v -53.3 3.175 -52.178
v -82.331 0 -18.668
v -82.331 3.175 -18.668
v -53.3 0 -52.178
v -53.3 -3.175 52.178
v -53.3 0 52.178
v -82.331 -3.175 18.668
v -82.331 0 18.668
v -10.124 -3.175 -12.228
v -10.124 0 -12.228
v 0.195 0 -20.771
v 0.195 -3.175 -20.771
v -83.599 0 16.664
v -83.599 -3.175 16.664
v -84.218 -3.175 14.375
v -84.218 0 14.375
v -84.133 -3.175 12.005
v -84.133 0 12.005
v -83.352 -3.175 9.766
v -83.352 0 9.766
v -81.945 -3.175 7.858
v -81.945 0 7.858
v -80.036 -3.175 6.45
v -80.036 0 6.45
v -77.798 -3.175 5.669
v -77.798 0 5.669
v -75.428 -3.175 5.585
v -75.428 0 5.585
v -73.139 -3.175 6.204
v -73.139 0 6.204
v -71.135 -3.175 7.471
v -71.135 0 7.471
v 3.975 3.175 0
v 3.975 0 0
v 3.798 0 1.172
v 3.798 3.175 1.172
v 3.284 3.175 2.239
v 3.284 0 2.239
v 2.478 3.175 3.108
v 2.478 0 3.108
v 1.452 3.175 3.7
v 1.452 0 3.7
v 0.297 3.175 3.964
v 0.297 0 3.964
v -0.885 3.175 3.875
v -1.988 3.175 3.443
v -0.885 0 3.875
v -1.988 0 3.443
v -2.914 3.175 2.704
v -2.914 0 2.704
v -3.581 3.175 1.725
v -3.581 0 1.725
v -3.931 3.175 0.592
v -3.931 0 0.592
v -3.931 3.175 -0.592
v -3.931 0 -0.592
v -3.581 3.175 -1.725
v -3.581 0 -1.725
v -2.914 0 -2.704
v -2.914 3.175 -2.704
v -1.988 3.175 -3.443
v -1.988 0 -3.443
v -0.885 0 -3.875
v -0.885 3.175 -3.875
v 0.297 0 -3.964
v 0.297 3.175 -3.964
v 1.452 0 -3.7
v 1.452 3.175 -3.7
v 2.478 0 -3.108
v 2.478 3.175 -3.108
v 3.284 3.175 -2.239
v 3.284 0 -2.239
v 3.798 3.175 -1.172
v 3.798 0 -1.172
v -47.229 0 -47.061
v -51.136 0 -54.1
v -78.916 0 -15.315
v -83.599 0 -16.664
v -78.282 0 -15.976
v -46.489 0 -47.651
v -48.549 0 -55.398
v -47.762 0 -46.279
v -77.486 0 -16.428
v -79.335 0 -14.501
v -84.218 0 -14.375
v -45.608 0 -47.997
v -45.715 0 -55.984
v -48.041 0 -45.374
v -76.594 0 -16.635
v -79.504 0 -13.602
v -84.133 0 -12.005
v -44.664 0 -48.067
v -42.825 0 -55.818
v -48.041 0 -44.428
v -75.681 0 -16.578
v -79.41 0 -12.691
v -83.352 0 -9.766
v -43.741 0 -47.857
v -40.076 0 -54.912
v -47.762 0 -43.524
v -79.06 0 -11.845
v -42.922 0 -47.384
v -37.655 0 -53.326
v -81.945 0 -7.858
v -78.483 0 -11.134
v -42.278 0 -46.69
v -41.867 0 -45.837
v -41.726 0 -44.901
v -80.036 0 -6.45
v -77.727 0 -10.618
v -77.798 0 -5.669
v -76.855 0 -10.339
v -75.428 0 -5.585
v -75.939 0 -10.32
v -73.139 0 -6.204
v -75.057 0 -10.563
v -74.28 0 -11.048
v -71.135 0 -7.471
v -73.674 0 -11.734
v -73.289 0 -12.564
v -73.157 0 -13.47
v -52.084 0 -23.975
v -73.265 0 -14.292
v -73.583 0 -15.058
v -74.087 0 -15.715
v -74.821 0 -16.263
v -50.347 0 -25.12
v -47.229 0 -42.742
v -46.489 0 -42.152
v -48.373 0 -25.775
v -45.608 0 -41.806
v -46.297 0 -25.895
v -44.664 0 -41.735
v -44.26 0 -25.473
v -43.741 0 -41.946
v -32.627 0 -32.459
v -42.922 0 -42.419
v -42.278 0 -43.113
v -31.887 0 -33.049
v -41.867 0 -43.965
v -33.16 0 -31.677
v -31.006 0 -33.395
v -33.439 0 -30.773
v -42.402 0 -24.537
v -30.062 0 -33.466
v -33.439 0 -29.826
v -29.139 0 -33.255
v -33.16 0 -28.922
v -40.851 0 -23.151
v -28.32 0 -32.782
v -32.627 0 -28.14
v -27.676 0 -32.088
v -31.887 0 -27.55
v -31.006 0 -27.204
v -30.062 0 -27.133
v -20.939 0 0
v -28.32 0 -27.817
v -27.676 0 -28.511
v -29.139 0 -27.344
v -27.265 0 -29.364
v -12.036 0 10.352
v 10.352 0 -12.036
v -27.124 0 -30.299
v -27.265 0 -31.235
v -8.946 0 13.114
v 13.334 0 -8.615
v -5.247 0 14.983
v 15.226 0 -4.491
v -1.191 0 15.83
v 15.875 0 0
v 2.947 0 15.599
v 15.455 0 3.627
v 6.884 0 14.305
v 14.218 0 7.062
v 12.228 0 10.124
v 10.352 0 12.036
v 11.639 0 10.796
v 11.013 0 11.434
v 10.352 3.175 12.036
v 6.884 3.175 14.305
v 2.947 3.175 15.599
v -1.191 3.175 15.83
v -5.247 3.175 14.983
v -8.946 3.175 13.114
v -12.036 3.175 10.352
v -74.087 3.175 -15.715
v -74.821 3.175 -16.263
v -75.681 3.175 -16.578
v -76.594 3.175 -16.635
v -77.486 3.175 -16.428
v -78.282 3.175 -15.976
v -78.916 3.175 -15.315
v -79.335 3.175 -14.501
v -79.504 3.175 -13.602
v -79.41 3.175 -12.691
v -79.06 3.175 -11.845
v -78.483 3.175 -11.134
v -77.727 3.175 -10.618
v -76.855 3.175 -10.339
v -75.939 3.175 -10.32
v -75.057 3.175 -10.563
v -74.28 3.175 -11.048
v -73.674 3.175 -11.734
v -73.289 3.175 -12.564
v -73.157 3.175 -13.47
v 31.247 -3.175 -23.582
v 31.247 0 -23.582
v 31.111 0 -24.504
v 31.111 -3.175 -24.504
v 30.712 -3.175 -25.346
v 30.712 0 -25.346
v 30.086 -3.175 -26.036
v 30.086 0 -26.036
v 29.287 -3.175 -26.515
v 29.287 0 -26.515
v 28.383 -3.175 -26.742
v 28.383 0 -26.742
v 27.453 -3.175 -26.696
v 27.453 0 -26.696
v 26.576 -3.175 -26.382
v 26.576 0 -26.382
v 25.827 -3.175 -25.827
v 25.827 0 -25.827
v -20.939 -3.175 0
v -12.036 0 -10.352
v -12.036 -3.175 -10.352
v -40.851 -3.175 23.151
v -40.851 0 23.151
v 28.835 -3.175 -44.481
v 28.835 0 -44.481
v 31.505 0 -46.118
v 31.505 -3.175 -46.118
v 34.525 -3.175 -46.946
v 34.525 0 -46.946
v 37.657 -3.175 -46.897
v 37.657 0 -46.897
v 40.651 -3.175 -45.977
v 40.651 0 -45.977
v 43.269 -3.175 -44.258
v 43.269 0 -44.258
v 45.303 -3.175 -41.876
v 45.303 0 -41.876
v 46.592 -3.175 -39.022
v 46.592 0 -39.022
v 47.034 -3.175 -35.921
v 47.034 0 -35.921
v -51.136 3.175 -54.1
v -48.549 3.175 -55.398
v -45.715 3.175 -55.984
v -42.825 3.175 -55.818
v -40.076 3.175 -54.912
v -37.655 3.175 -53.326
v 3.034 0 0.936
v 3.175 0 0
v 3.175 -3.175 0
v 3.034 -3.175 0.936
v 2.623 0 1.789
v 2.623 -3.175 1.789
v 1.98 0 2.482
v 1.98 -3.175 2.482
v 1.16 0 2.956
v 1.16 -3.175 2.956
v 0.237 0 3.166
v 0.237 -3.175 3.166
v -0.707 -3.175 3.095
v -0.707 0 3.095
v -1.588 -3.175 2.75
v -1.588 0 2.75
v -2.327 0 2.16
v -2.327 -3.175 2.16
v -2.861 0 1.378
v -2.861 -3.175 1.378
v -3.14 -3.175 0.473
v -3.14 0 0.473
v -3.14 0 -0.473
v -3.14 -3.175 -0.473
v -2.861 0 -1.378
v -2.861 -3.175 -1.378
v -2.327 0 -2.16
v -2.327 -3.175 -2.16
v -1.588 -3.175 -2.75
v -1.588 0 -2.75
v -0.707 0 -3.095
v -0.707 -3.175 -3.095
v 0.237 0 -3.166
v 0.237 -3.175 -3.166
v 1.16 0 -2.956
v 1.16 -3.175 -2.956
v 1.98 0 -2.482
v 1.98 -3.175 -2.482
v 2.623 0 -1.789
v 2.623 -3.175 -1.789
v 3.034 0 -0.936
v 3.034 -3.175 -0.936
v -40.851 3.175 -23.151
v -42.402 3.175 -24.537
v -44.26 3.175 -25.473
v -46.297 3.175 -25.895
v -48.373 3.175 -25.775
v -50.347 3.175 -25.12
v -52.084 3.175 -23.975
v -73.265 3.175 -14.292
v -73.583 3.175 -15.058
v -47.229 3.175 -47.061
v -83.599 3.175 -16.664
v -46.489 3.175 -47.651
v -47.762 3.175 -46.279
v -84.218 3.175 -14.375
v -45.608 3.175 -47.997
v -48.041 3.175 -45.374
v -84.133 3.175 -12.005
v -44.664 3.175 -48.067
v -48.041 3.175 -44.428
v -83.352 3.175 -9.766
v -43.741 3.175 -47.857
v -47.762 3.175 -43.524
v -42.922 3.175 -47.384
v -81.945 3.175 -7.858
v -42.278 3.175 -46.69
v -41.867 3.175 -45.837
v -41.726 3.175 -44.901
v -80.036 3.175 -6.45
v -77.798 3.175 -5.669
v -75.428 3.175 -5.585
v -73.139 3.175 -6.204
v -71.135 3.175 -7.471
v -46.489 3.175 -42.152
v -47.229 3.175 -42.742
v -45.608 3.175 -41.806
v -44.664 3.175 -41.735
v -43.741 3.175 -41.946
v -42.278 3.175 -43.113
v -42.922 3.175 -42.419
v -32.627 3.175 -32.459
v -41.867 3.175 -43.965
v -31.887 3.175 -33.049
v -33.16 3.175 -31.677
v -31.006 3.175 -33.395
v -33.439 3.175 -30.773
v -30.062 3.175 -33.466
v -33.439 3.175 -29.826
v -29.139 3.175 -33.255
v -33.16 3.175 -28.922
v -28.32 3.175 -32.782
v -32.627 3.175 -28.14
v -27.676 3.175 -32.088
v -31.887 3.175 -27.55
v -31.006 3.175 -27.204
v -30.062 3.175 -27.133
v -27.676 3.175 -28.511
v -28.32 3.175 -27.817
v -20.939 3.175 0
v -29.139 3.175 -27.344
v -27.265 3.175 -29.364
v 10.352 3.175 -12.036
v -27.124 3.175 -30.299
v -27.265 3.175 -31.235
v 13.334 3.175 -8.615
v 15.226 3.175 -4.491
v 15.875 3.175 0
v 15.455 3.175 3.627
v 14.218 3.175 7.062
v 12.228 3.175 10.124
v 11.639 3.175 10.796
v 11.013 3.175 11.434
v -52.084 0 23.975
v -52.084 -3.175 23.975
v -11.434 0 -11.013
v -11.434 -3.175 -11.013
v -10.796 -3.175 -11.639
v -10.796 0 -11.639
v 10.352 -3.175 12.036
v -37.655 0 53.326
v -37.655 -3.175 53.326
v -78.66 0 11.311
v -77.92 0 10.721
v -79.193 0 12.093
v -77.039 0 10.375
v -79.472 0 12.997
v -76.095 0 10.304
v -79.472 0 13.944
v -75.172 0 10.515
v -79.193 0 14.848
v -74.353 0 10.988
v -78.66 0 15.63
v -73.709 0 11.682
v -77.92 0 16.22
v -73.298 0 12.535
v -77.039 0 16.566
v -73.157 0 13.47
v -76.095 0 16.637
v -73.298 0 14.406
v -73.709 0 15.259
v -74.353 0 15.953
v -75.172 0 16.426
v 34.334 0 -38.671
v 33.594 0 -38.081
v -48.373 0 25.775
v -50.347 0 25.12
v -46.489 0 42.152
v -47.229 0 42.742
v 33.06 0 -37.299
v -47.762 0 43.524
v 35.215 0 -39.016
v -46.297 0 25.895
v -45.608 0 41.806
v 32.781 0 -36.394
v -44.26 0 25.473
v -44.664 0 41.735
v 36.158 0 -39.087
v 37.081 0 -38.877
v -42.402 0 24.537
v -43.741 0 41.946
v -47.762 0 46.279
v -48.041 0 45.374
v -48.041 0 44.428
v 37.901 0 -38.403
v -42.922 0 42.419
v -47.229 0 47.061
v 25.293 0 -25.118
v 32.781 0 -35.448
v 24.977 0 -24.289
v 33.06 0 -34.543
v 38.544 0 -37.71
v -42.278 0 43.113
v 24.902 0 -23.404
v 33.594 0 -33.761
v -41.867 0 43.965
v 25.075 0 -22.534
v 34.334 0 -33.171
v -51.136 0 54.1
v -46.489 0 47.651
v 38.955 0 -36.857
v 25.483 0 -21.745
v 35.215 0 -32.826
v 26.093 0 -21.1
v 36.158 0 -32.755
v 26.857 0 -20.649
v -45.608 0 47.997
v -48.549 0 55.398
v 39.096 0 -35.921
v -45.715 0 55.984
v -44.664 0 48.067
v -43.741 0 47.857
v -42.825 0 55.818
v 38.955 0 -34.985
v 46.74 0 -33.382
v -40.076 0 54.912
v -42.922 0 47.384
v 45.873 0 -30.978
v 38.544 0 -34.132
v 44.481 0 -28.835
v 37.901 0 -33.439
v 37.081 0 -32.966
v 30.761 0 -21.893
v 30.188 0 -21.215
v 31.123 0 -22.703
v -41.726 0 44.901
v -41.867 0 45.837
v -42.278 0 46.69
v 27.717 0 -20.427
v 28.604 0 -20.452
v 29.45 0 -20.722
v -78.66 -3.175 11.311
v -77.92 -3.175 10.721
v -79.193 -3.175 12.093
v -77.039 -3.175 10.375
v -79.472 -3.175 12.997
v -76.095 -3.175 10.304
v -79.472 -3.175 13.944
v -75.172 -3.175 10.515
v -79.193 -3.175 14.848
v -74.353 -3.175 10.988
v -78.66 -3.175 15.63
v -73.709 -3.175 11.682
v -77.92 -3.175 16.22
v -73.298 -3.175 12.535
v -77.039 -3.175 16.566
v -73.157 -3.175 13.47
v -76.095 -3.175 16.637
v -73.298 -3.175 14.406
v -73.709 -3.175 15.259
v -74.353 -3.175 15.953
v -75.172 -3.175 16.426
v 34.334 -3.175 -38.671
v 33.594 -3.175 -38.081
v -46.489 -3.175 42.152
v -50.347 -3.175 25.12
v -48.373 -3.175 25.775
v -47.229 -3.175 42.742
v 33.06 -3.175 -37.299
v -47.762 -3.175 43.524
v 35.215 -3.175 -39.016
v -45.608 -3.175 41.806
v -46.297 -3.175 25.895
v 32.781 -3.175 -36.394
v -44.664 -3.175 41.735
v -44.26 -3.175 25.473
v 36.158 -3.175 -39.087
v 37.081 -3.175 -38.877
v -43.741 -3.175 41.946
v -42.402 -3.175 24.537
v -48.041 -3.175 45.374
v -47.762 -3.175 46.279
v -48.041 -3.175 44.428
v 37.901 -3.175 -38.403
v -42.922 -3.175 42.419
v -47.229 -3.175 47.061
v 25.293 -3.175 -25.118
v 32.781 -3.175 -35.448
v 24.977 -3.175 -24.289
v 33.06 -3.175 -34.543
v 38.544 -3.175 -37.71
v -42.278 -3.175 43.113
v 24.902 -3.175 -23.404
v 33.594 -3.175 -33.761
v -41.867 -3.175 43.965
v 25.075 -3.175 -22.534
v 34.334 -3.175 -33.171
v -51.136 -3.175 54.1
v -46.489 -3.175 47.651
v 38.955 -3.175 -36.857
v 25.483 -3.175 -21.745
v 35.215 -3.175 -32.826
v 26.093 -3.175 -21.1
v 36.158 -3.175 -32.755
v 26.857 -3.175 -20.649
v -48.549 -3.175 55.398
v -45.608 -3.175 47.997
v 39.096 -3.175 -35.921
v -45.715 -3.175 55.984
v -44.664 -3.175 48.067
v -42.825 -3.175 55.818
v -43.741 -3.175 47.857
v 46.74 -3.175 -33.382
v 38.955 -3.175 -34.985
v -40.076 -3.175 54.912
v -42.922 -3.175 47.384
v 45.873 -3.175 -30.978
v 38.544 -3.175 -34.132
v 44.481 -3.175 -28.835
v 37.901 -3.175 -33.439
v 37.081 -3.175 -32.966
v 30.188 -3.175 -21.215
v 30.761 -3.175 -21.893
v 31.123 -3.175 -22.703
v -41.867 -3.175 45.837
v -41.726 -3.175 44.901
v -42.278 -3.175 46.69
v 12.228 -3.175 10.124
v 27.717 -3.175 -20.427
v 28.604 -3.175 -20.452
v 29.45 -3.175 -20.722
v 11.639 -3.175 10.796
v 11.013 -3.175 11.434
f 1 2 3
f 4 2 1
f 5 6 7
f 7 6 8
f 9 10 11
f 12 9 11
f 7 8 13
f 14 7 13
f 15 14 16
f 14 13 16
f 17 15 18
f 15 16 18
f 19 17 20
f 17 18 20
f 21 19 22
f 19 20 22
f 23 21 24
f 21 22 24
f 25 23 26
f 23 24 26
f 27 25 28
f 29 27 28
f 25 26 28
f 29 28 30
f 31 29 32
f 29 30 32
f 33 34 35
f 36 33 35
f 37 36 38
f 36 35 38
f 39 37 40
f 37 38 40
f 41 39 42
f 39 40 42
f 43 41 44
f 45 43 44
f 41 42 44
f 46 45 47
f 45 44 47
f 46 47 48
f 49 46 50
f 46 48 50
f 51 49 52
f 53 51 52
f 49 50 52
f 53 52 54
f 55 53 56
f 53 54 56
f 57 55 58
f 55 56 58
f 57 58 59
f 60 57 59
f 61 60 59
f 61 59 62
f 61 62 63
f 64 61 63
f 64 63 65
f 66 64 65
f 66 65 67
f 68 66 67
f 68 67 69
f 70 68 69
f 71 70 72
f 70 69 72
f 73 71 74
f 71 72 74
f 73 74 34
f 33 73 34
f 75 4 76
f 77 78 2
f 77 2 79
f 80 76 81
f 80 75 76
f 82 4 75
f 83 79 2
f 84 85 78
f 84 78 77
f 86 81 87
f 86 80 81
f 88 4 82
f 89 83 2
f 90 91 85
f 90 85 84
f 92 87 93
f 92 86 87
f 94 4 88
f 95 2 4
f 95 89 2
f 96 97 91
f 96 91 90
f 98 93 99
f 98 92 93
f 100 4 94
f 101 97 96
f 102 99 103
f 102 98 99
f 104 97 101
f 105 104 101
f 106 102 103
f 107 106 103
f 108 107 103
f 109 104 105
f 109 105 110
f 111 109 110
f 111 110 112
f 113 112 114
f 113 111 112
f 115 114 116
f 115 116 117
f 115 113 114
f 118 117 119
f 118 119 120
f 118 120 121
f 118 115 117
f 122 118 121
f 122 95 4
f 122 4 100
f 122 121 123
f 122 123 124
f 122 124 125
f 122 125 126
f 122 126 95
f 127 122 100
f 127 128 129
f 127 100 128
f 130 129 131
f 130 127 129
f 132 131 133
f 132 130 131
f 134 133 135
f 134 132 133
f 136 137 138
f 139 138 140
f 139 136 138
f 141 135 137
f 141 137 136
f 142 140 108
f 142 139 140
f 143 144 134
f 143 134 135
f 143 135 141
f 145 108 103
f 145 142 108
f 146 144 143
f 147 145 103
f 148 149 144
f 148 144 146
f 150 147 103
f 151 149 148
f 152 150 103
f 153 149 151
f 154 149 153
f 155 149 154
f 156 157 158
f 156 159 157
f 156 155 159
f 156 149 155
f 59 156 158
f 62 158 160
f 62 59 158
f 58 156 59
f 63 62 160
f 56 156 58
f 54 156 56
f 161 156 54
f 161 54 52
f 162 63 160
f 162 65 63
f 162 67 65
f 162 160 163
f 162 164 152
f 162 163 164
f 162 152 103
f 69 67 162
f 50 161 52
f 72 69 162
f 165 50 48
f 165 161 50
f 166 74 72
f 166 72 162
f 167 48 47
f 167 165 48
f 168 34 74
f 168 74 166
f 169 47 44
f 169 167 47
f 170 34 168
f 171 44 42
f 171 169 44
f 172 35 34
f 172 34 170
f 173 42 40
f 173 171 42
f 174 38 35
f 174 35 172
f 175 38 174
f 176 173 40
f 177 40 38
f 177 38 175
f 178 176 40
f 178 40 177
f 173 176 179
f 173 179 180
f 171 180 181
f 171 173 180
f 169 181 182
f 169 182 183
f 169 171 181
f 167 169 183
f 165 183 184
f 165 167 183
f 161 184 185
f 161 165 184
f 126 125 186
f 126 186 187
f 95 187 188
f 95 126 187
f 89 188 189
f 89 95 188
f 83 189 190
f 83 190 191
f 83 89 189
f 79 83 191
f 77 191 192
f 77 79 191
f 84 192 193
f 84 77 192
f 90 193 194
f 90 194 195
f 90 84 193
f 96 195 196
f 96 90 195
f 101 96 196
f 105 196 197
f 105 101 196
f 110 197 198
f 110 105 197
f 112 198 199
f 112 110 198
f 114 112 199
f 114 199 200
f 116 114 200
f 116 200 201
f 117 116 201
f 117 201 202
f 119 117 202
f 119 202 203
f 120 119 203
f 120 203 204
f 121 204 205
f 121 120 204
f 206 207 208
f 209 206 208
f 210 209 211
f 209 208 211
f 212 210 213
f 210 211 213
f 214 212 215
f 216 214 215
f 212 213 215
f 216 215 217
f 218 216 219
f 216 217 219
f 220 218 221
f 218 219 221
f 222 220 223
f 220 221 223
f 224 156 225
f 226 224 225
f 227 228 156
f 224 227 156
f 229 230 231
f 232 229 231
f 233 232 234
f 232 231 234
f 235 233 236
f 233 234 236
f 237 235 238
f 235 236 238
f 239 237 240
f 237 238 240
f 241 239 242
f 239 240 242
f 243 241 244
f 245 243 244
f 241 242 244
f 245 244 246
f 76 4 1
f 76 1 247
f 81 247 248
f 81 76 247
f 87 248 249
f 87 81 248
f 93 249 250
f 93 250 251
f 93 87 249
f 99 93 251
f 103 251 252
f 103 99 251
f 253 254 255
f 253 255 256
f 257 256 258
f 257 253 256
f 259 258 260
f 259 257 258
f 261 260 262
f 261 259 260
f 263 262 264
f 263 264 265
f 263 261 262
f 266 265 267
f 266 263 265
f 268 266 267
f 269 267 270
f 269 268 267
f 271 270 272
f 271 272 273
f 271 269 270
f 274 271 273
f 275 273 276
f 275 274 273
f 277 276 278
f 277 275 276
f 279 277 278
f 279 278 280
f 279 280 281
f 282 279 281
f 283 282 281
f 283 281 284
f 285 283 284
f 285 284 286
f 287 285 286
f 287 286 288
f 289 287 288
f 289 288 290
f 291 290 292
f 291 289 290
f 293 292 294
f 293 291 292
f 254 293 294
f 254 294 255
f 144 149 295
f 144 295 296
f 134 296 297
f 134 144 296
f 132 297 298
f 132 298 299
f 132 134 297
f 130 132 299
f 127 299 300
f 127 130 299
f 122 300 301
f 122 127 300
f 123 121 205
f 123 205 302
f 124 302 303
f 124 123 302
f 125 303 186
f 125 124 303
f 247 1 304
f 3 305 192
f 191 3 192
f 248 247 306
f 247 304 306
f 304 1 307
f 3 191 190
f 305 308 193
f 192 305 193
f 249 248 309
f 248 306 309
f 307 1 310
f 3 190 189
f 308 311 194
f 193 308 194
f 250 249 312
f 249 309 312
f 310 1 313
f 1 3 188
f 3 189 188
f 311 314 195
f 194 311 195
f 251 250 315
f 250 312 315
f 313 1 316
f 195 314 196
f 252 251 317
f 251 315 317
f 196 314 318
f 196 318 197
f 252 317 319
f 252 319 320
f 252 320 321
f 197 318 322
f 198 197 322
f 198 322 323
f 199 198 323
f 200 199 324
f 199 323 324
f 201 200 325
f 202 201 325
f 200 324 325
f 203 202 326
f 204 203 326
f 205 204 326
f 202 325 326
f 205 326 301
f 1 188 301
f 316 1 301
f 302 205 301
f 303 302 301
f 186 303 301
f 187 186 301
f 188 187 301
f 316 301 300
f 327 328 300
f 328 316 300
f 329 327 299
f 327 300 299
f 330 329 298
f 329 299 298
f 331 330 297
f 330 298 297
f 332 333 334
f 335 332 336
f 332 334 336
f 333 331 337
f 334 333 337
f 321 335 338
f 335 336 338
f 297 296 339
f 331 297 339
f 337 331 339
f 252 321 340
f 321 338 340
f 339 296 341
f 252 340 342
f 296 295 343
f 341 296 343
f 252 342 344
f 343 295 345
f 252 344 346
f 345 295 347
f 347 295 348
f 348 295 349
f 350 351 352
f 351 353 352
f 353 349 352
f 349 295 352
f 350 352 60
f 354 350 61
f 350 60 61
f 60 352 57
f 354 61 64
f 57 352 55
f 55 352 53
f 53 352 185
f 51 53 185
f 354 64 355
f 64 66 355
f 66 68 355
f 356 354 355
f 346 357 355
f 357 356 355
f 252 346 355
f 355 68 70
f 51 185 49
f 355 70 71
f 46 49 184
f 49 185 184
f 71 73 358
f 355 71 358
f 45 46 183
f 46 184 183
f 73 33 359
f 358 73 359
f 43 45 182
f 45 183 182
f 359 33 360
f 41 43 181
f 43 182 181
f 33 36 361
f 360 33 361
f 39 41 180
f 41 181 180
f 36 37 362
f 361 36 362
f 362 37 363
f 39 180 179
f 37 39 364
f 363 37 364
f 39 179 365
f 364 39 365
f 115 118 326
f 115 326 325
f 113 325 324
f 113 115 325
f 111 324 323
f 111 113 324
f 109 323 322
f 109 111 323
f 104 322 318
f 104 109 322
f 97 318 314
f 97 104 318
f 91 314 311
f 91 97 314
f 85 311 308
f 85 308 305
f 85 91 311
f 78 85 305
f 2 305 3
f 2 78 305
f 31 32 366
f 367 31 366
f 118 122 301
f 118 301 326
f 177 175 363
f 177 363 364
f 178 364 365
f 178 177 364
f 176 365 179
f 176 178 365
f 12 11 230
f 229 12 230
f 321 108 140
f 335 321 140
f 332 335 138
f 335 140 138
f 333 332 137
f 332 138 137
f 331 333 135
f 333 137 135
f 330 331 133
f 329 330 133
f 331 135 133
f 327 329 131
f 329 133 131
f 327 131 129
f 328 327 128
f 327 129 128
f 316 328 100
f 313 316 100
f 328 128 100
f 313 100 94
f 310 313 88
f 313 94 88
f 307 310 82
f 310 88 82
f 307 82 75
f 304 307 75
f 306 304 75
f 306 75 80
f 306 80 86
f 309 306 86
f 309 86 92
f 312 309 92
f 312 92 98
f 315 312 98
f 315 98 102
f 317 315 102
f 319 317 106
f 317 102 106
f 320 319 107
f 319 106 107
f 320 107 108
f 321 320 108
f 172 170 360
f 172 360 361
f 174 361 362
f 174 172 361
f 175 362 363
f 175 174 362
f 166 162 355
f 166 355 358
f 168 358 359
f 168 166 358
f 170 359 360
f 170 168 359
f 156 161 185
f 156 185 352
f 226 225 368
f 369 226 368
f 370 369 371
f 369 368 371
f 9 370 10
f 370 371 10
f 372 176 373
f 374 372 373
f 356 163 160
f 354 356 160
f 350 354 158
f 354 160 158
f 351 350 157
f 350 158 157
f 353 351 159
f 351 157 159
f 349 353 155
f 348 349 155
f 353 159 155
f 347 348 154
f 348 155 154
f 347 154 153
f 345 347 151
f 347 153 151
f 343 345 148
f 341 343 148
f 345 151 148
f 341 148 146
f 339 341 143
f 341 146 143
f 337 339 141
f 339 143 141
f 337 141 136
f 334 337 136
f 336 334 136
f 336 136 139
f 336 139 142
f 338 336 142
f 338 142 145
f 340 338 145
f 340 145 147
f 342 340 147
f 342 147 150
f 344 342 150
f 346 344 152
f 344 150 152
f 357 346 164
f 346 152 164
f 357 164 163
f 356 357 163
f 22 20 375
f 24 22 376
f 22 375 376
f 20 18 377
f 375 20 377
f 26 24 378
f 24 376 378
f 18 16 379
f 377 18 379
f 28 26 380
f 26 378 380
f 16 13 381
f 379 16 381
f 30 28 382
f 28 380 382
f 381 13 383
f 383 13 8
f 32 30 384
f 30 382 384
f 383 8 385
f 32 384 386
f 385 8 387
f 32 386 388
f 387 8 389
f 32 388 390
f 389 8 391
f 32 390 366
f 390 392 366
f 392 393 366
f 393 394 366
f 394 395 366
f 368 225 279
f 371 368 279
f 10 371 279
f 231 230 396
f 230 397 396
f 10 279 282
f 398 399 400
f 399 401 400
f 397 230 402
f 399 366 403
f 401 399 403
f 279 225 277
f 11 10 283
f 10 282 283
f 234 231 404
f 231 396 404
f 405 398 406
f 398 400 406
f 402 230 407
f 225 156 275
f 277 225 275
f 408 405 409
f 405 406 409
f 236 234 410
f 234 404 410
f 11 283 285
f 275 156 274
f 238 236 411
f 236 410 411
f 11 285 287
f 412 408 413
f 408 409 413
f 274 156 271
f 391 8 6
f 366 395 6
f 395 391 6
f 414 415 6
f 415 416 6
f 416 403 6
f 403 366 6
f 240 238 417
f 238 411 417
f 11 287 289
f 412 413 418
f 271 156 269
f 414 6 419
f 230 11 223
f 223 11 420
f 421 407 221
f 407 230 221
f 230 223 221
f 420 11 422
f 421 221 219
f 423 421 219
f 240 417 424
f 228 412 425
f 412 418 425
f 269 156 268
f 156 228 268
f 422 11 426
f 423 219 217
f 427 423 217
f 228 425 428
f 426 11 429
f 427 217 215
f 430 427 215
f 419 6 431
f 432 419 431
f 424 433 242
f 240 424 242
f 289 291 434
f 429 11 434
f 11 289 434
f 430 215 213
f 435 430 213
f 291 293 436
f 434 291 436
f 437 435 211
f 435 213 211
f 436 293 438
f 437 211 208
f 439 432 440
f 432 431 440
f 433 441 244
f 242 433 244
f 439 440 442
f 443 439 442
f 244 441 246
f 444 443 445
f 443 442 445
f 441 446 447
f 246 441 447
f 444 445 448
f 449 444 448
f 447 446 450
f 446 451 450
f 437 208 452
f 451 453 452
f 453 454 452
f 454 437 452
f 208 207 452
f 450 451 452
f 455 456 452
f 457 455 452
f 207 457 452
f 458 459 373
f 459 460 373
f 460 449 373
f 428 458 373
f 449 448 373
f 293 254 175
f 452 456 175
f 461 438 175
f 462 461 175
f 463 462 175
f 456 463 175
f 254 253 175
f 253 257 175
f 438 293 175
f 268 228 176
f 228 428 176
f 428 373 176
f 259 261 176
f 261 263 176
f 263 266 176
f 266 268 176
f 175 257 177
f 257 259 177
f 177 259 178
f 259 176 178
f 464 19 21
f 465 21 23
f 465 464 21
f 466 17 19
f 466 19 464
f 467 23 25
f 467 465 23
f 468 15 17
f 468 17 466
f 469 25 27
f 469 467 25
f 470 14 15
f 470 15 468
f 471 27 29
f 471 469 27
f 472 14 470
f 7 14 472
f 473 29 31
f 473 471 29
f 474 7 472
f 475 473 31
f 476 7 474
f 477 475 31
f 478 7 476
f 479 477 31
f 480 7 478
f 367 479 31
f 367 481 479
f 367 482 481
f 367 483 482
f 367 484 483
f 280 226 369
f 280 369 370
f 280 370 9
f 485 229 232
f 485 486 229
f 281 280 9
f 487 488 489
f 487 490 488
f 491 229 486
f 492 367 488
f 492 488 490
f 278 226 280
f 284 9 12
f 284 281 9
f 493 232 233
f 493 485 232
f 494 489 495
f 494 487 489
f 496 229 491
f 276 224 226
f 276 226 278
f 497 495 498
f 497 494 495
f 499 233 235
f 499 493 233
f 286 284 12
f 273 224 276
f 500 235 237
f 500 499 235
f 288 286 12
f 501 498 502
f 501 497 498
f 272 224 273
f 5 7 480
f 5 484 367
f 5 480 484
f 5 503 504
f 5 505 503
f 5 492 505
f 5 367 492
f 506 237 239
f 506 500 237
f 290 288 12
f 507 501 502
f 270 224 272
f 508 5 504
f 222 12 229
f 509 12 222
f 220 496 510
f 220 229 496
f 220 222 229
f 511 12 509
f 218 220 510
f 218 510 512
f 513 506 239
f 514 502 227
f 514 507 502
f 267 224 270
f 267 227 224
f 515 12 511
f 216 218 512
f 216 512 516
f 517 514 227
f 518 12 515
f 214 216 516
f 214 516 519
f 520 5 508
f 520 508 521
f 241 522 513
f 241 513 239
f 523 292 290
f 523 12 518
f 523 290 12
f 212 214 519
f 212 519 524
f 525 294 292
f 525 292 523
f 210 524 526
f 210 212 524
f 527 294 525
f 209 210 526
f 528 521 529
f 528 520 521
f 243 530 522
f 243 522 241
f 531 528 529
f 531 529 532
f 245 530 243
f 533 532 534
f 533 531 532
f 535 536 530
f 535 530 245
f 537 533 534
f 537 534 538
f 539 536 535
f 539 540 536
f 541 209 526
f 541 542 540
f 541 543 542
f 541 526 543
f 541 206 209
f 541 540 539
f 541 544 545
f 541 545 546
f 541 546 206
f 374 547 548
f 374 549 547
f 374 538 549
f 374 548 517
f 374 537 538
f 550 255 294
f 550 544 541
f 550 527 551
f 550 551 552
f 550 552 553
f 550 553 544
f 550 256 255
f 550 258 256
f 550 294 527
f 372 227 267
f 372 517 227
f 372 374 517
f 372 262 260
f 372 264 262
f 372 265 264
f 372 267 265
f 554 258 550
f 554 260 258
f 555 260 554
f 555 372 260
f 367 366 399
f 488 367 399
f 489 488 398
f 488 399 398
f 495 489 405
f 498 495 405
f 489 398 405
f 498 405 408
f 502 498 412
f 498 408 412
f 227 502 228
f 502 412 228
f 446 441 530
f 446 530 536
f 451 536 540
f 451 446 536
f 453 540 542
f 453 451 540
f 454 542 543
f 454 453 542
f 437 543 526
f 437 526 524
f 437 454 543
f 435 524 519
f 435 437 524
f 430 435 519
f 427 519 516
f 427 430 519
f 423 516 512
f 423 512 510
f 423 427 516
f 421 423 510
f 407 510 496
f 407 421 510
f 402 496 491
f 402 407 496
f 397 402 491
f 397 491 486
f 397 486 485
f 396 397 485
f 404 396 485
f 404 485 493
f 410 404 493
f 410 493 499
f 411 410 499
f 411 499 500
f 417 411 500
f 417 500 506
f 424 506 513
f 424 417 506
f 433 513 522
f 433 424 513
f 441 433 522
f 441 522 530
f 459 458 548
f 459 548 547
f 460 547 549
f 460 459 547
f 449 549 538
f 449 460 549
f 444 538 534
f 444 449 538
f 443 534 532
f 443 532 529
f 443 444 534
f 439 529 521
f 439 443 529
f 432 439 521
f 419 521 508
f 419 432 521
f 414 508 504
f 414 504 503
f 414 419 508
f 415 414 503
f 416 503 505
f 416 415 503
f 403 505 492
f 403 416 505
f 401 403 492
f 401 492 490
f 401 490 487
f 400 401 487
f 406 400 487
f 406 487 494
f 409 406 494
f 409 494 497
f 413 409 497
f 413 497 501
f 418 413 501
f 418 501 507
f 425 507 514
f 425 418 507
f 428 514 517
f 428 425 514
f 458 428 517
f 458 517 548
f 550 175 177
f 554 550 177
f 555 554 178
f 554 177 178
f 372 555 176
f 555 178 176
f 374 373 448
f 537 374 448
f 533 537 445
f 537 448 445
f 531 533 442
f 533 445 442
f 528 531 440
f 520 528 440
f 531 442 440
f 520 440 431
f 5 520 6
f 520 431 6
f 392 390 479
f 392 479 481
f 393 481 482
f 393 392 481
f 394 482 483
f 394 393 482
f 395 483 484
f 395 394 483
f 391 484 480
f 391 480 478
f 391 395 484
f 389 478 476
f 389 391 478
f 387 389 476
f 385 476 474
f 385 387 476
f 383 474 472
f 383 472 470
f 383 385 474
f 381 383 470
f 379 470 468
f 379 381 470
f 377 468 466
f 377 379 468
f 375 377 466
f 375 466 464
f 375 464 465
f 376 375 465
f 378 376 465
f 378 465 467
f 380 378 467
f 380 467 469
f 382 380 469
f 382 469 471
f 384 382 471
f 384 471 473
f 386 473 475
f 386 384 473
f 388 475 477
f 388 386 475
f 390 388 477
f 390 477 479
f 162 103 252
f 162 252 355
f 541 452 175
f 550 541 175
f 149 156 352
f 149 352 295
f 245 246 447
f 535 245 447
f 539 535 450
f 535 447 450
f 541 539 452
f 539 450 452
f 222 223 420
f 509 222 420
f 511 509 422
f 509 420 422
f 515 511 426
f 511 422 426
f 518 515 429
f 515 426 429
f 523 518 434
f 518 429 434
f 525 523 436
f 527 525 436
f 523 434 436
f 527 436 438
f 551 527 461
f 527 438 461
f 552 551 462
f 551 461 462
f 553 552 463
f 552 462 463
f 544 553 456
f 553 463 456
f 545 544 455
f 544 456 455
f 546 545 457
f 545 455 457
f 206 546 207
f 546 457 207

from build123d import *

# Parameters (mm, degrees)
F0_R     = 3.175
F0_R_2   = 3.9751
F1_DEPTH = 3.175
F2_DEPTH = 3.175


with BuildPart() as f1:
    # F0 (on Front) → F1 (new body)
    with BuildSketch(Plane.XZ):
        with BuildLine():
            ThreePointArc((-82.331405076, 18.6678036462), (-73.5586383483, 20.9075469092), (-68.3946770291, 13.4703841816))
            ThreePointArc((-68.3946770291, 13.4703841816), (-69.1121208226, 10.1727039932), (-71.1347575644, 7.4711561347))
            Line((-71.1347575644, 7.4711561347), (-52.0843267669, 23.9754595323))
            ThreePointArc((-52.0843267669, 23.9754595323), (-46.2965222838, 25.8954961667), (-40.8511612346, 23.1508168672))
            Line((-40.8511612346, 23.1508168672), (-20.9391765456, 0))
            Line((-20.9391765456, 0), (-12.0356034274, 10.3518054047))
            ThreePointArc((-12.0356034274, 10.3518054047), (-1.190625, 15.8302885984), (10.3518054047, 12.0356034274))
            Line((10.3518054047, 12.0356034274), (-37.655016822, 53.3262030046))
            ThreePointArc((-37.655016822, 53.3262030046), (-34.8014845049, 49.5361241819), (-33.7887806053, 44.9012806053))
            ThreePointArc((-33.7887806053, 44.9012806053), (-48.7842347585, 34.4892527868), (-53.300199871, 52.1776678558))
            Line((-53.300199871, 52.1776678558), (-82.331405076, 18.6678036462))
        make_face()
        with BuildLine():
            ThreePointArc((-71.1347575644, 7.4711561347), (-69.1121208226, 10.1727039932), (-68.3946770291, 13.4703841816))
            ThreePointArc((-68.3946770291, 13.4703841816), (-73.5586383483, 20.9075469092), (-82.331405076, 18.6678036462))
            ThreePointArc((-82.331405076, 18.6678036462), (-81.9448371048, 7.8577241059), (-71.1347575644, 7.4711561347))
        make_face()
        with Locations((-76.3321770291, 13.4703841816)):
            Circle(F0_R, mode=Mode.SUBTRACT)
        with BuildLine():
            ThreePointArc((-37.655016822, 53.3262030046), (-45.7148756595, 55.9839571475), (-53.300199871, 52.1776678558))
            ThreePointArc((-53.300199871, 52.1776678558), (-48.7842347585, 34.4892527868), (-33.7887806053, 44.9012806053))
            ThreePointArc((-33.7887806053, 44.9012806053), (-34.8014845049, 49.5361241819), (-37.655016822, 53.3262030046))
        make_face()
        with Locations((-44.9012806053, 44.9012806053)):
            Circle(F0_R, mode=Mode.SUBTRACT)
        with BuildLine():
            ThreePointArc((12.2282550252, 10.1235074968), (11.3304373246, 11.1192092809), (10.3518054047, 12.0356034274))
            ThreePointArc((10.3518054047, 12.0356034274), (-1.190625, 15.8302885984), (-12.0356034274, 10.3518054047))
            ThreePointArc((-12.0356034274, 10.3518054047), (-15.875, 0), (-12.0356034274, -10.3518054047))
            ThreePointArc((-12.0356034274, -10.3518054047), (-11.1192092809, -11.3304373246), (-10.1235074968, -12.2282550252))
            ThreePointArc((-10.1235074968, -12.2282550252), (0.1493607821, -15.87429735), (10.3518054047, -12.0356034274))
            ThreePointArc((10.3518054047, -12.0356034274), (14.4282801435, -6.6212051093), (15.875, 0))
            ThreePointArc((15.875, 0), (14.9355142785, 5.3801522504), (12.2282550252, 10.1235074968))
        make_face()
        Circle(F0_R_2, mode=Mode.SUBTRACT)
        Circle(F0_R_2)
        Circle(F0_R, mode=Mode.SUBTRACT)
        with BuildLine():
            Line((44.4808030019, -28.8345692365), (12.2282550252, 10.1235074968))
            ThreePointArc((12.2282550252, 10.1235074968), (14.9355142785, 5.3801522504), (15.875, 0))
            ThreePointArc((15.875, 0), (14.4282801435, -6.6212051093), (10.3518054047, -12.0356034274))
            Line((10.3518054047, -12.0356034274), (0.1954344954, -20.7710836138))
            Line((0.1954344954, -20.7710836138), (28.8345692365, -44.4808030019))
            ThreePointArc((28.8345692365, -44.4808030019), (28.0633003783, -28.0633003783), (44.4808030019, -28.8345692365))
        make_face()
        with BuildLine():
            ThreePointArc((25.8272166042, -25.8272166042), (26.8572607367, -20.6488350582), (31.2472806345, -23.5821525739))
            ThreePointArc((31.2472806345, -23.5821525739), (29.2873005322, -26.5154700897), (25.8272166042, -25.8272166042))
        make_face(mode=Mode.SUBTRACT)
        with BuildLine():
            ThreePointArc((47.0335244843, -35.9210244843), (46.3758844792, -32.154917909), (44.4808030019, -28.8345692365))
            ThreePointArc((44.4808030019, -28.8345692365), (28.0633003783, -28.0633003783), (28.8345692365, -44.4808030019))
            ThreePointArc((28.8345692365, -44.4808030019), (40.650687385, -45.9767663811), (47.0335244843, -35.9210244843))
        make_face()
        with Locations((35.9210244843, -35.9210244843)):
            Circle(F0_R, mode=Mode.SUBTRACT)
        with BuildLine():
            ThreePointArc((10.3518054047, -12.0356034274), (0.1493607821, -15.87429735), (-10.1235074968, -12.2282550252))
            Line((-10.1235074968, -12.2282550252), (0.1954344954, -20.7710836138))
            Line((0.1954344954, -20.7710836138), (10.3518054047, -12.0356034274))
        make_face()
        with BuildLine():
            Line((-12.0356034274, 10.3518054047), (-20.9391765456, 0))
            Line((-20.9391765456, 0), (-12.0356034274, -10.3518054047))
            ThreePointArc((-12.0356034274, -10.3518054047), (-15.875, 0), (-12.0356034274, 10.3518054047))
        make_face()
    extrude(amount=F1_DEPTH)


with BuildPart() as f2:
    # F0 (on Front) → F2 (new body)
    with BuildSketch(Plane.XZ):
        with BuildLine():
            Line((-12.0356034274, -10.3518054047), (-20.9391765456, 0))
            Line((-20.9391765456, 0), (-40.8511612346, -23.1508168672))
            ThreePointArc((-40.8511612346, -23.1508168672), (-46.2965222838, -25.8954961667), (-52.0843267669, -23.9754595323))
            Line((-52.0843267669, -23.9754595323), (-71.1347575644, -7.4711561347))
            ThreePointArc((-71.1347575644, -7.4711561347), (-69.1121208226, -10.1727039932), (-68.3946770291, -13.4703841816))
            ThreePointArc((-68.3946770291, -13.4703841816), (-73.5586383483, -20.9075469092), (-82.331405076, -18.6678036462))
            Line((-82.331405076, -18.6678036462), (-53.300199871, -52.1776678558))
            ThreePointArc((-53.300199871, -52.1776678558), (-56.0137627922, -44.9211777548), (-53.3262030046, -37.655016822))
            ThreePointArc((-53.3262030046, -37.655016822), (-41.0369756168, -34.4823169714), (-33.7887806053, -44.9012806053))
            ThreePointArc((-33.7887806053, -44.9012806053), (-34.8014845049, -49.5361241819), (-37.655016822, -53.3262030046))
            Line((-37.655016822, -53.3262030046), (0.1954344954, -20.7710836138))
            Line((0.1954344954, -20.7710836138), (-10.1235074968, -12.2282550252))
            ThreePointArc((-10.1235074968, -12.2282550252), (-11.1192092809, -11.3304373246), (-12.0356034274, -10.3518054047))
        make_face()
        with Locations((-30.2993841525, -30.2993841525)):
            Circle(F0_R, mode=Mode.SUBTRACT)
        with BuildLine():
            ThreePointArc((10.3518054047, -12.0356034274), (0.1493607821, -15.87429735), (-10.1235074968, -12.2282550252))
            Line((-10.1235074968, -12.2282550252), (0.1954344954, -20.7710836138))
            Line((0.1954344954, -20.7710836138), (10.3518054047, -12.0356034274))
        make_face()
        with BuildLine():
            Line((-12.0356034274, 10.3518054047), (-20.9391765456, 0))
            Line((-20.9391765456, 0), (-12.0356034274, -10.3518054047))
            ThreePointArc((-12.0356034274, -10.3518054047), (-15.875, 0), (-12.0356034274, 10.3518054047))
        make_face()
        with BuildLine():
            ThreePointArc((12.2282550252, 10.1235074968), (11.3304373246, 11.1192092809), (10.3518054047, 12.0356034274))
            ThreePointArc((10.3518054047, 12.0356034274), (-1.190625, 15.8302885984), (-12.0356034274, 10.3518054047))
            ThreePointArc((-12.0356034274, 10.3518054047), (-15.875, 0), (-12.0356034274, -10.3518054047))
            ThreePointArc((-12.0356034274, -10.3518054047), (-11.1192092809, -11.3304373246), (-10.1235074968, -12.2282550252))
            ThreePointArc((-10.1235074968, -12.2282550252), (0.1493607821, -15.87429735), (10.3518054047, -12.0356034274))
            ThreePointArc((10.3518054047, -12.0356034274), (14.4282801435, -6.6212051093), (15.875, 0))
            ThreePointArc((15.875, 0), (14.9355142785, 5.3801522504), (12.2282550252, 10.1235074968))
        make_face()
        Circle(F0_R_2, mode=Mode.SUBTRACT)
        with BuildLine():
            ThreePointArc((-53.300199871, -52.1776678558), (-45.7148756595, -55.9839571475), (-37.655016822, -53.3262030046))
            ThreePointArc((-37.655016822, -53.3262030046), (-34.8014845049, -49.5361241819), (-33.7887806053, -44.9012806053))
            ThreePointArc((-33.7887806053, -44.9012806053), (-41.0369756168, -34.4823169714), (-53.3262030046, -37.655016822))
            ThreePointArc((-53.3262030046, -37.655016822), (-56.0137627922, -44.9211777548), (-53.300199871, -52.1776678558))
        make_face()
        with Locations((-44.9012806053, -44.9012806053)):
            Circle(F0_R, mode=Mode.SUBTRACT)
        with BuildLine():
            ThreePointArc((-68.3946770291, -13.4703841816), (-69.1121208226, -10.1727039932), (-71.1347575644, -7.4711561347))
            ThreePointArc((-71.1347575644, -7.4711561347), (-81.9448371048, -7.8577241059), (-82.331405076, -18.6678036462))
            ThreePointArc((-82.331405076, -18.6678036462), (-73.5586383483, -20.9075469092), (-68.3946770291, -13.4703841816))
        make_face()
        with BuildLine():
            ThreePointArc((-74.0871129988, -15.7154482119), (-79.2654945448, -12.2553642838), (-73.1571770291, -13.4703841816))
            ThreePointArc((-73.1571770291, -13.4703841816), (-73.3988595134, -14.6854040794), (-74.0871129988, -15.7154482119))
        make_face(mode=Mode.SUBTRACT)
    extrude(amount=-F2_DEPTH)


solid = Compound([f1.part, f2.part])
